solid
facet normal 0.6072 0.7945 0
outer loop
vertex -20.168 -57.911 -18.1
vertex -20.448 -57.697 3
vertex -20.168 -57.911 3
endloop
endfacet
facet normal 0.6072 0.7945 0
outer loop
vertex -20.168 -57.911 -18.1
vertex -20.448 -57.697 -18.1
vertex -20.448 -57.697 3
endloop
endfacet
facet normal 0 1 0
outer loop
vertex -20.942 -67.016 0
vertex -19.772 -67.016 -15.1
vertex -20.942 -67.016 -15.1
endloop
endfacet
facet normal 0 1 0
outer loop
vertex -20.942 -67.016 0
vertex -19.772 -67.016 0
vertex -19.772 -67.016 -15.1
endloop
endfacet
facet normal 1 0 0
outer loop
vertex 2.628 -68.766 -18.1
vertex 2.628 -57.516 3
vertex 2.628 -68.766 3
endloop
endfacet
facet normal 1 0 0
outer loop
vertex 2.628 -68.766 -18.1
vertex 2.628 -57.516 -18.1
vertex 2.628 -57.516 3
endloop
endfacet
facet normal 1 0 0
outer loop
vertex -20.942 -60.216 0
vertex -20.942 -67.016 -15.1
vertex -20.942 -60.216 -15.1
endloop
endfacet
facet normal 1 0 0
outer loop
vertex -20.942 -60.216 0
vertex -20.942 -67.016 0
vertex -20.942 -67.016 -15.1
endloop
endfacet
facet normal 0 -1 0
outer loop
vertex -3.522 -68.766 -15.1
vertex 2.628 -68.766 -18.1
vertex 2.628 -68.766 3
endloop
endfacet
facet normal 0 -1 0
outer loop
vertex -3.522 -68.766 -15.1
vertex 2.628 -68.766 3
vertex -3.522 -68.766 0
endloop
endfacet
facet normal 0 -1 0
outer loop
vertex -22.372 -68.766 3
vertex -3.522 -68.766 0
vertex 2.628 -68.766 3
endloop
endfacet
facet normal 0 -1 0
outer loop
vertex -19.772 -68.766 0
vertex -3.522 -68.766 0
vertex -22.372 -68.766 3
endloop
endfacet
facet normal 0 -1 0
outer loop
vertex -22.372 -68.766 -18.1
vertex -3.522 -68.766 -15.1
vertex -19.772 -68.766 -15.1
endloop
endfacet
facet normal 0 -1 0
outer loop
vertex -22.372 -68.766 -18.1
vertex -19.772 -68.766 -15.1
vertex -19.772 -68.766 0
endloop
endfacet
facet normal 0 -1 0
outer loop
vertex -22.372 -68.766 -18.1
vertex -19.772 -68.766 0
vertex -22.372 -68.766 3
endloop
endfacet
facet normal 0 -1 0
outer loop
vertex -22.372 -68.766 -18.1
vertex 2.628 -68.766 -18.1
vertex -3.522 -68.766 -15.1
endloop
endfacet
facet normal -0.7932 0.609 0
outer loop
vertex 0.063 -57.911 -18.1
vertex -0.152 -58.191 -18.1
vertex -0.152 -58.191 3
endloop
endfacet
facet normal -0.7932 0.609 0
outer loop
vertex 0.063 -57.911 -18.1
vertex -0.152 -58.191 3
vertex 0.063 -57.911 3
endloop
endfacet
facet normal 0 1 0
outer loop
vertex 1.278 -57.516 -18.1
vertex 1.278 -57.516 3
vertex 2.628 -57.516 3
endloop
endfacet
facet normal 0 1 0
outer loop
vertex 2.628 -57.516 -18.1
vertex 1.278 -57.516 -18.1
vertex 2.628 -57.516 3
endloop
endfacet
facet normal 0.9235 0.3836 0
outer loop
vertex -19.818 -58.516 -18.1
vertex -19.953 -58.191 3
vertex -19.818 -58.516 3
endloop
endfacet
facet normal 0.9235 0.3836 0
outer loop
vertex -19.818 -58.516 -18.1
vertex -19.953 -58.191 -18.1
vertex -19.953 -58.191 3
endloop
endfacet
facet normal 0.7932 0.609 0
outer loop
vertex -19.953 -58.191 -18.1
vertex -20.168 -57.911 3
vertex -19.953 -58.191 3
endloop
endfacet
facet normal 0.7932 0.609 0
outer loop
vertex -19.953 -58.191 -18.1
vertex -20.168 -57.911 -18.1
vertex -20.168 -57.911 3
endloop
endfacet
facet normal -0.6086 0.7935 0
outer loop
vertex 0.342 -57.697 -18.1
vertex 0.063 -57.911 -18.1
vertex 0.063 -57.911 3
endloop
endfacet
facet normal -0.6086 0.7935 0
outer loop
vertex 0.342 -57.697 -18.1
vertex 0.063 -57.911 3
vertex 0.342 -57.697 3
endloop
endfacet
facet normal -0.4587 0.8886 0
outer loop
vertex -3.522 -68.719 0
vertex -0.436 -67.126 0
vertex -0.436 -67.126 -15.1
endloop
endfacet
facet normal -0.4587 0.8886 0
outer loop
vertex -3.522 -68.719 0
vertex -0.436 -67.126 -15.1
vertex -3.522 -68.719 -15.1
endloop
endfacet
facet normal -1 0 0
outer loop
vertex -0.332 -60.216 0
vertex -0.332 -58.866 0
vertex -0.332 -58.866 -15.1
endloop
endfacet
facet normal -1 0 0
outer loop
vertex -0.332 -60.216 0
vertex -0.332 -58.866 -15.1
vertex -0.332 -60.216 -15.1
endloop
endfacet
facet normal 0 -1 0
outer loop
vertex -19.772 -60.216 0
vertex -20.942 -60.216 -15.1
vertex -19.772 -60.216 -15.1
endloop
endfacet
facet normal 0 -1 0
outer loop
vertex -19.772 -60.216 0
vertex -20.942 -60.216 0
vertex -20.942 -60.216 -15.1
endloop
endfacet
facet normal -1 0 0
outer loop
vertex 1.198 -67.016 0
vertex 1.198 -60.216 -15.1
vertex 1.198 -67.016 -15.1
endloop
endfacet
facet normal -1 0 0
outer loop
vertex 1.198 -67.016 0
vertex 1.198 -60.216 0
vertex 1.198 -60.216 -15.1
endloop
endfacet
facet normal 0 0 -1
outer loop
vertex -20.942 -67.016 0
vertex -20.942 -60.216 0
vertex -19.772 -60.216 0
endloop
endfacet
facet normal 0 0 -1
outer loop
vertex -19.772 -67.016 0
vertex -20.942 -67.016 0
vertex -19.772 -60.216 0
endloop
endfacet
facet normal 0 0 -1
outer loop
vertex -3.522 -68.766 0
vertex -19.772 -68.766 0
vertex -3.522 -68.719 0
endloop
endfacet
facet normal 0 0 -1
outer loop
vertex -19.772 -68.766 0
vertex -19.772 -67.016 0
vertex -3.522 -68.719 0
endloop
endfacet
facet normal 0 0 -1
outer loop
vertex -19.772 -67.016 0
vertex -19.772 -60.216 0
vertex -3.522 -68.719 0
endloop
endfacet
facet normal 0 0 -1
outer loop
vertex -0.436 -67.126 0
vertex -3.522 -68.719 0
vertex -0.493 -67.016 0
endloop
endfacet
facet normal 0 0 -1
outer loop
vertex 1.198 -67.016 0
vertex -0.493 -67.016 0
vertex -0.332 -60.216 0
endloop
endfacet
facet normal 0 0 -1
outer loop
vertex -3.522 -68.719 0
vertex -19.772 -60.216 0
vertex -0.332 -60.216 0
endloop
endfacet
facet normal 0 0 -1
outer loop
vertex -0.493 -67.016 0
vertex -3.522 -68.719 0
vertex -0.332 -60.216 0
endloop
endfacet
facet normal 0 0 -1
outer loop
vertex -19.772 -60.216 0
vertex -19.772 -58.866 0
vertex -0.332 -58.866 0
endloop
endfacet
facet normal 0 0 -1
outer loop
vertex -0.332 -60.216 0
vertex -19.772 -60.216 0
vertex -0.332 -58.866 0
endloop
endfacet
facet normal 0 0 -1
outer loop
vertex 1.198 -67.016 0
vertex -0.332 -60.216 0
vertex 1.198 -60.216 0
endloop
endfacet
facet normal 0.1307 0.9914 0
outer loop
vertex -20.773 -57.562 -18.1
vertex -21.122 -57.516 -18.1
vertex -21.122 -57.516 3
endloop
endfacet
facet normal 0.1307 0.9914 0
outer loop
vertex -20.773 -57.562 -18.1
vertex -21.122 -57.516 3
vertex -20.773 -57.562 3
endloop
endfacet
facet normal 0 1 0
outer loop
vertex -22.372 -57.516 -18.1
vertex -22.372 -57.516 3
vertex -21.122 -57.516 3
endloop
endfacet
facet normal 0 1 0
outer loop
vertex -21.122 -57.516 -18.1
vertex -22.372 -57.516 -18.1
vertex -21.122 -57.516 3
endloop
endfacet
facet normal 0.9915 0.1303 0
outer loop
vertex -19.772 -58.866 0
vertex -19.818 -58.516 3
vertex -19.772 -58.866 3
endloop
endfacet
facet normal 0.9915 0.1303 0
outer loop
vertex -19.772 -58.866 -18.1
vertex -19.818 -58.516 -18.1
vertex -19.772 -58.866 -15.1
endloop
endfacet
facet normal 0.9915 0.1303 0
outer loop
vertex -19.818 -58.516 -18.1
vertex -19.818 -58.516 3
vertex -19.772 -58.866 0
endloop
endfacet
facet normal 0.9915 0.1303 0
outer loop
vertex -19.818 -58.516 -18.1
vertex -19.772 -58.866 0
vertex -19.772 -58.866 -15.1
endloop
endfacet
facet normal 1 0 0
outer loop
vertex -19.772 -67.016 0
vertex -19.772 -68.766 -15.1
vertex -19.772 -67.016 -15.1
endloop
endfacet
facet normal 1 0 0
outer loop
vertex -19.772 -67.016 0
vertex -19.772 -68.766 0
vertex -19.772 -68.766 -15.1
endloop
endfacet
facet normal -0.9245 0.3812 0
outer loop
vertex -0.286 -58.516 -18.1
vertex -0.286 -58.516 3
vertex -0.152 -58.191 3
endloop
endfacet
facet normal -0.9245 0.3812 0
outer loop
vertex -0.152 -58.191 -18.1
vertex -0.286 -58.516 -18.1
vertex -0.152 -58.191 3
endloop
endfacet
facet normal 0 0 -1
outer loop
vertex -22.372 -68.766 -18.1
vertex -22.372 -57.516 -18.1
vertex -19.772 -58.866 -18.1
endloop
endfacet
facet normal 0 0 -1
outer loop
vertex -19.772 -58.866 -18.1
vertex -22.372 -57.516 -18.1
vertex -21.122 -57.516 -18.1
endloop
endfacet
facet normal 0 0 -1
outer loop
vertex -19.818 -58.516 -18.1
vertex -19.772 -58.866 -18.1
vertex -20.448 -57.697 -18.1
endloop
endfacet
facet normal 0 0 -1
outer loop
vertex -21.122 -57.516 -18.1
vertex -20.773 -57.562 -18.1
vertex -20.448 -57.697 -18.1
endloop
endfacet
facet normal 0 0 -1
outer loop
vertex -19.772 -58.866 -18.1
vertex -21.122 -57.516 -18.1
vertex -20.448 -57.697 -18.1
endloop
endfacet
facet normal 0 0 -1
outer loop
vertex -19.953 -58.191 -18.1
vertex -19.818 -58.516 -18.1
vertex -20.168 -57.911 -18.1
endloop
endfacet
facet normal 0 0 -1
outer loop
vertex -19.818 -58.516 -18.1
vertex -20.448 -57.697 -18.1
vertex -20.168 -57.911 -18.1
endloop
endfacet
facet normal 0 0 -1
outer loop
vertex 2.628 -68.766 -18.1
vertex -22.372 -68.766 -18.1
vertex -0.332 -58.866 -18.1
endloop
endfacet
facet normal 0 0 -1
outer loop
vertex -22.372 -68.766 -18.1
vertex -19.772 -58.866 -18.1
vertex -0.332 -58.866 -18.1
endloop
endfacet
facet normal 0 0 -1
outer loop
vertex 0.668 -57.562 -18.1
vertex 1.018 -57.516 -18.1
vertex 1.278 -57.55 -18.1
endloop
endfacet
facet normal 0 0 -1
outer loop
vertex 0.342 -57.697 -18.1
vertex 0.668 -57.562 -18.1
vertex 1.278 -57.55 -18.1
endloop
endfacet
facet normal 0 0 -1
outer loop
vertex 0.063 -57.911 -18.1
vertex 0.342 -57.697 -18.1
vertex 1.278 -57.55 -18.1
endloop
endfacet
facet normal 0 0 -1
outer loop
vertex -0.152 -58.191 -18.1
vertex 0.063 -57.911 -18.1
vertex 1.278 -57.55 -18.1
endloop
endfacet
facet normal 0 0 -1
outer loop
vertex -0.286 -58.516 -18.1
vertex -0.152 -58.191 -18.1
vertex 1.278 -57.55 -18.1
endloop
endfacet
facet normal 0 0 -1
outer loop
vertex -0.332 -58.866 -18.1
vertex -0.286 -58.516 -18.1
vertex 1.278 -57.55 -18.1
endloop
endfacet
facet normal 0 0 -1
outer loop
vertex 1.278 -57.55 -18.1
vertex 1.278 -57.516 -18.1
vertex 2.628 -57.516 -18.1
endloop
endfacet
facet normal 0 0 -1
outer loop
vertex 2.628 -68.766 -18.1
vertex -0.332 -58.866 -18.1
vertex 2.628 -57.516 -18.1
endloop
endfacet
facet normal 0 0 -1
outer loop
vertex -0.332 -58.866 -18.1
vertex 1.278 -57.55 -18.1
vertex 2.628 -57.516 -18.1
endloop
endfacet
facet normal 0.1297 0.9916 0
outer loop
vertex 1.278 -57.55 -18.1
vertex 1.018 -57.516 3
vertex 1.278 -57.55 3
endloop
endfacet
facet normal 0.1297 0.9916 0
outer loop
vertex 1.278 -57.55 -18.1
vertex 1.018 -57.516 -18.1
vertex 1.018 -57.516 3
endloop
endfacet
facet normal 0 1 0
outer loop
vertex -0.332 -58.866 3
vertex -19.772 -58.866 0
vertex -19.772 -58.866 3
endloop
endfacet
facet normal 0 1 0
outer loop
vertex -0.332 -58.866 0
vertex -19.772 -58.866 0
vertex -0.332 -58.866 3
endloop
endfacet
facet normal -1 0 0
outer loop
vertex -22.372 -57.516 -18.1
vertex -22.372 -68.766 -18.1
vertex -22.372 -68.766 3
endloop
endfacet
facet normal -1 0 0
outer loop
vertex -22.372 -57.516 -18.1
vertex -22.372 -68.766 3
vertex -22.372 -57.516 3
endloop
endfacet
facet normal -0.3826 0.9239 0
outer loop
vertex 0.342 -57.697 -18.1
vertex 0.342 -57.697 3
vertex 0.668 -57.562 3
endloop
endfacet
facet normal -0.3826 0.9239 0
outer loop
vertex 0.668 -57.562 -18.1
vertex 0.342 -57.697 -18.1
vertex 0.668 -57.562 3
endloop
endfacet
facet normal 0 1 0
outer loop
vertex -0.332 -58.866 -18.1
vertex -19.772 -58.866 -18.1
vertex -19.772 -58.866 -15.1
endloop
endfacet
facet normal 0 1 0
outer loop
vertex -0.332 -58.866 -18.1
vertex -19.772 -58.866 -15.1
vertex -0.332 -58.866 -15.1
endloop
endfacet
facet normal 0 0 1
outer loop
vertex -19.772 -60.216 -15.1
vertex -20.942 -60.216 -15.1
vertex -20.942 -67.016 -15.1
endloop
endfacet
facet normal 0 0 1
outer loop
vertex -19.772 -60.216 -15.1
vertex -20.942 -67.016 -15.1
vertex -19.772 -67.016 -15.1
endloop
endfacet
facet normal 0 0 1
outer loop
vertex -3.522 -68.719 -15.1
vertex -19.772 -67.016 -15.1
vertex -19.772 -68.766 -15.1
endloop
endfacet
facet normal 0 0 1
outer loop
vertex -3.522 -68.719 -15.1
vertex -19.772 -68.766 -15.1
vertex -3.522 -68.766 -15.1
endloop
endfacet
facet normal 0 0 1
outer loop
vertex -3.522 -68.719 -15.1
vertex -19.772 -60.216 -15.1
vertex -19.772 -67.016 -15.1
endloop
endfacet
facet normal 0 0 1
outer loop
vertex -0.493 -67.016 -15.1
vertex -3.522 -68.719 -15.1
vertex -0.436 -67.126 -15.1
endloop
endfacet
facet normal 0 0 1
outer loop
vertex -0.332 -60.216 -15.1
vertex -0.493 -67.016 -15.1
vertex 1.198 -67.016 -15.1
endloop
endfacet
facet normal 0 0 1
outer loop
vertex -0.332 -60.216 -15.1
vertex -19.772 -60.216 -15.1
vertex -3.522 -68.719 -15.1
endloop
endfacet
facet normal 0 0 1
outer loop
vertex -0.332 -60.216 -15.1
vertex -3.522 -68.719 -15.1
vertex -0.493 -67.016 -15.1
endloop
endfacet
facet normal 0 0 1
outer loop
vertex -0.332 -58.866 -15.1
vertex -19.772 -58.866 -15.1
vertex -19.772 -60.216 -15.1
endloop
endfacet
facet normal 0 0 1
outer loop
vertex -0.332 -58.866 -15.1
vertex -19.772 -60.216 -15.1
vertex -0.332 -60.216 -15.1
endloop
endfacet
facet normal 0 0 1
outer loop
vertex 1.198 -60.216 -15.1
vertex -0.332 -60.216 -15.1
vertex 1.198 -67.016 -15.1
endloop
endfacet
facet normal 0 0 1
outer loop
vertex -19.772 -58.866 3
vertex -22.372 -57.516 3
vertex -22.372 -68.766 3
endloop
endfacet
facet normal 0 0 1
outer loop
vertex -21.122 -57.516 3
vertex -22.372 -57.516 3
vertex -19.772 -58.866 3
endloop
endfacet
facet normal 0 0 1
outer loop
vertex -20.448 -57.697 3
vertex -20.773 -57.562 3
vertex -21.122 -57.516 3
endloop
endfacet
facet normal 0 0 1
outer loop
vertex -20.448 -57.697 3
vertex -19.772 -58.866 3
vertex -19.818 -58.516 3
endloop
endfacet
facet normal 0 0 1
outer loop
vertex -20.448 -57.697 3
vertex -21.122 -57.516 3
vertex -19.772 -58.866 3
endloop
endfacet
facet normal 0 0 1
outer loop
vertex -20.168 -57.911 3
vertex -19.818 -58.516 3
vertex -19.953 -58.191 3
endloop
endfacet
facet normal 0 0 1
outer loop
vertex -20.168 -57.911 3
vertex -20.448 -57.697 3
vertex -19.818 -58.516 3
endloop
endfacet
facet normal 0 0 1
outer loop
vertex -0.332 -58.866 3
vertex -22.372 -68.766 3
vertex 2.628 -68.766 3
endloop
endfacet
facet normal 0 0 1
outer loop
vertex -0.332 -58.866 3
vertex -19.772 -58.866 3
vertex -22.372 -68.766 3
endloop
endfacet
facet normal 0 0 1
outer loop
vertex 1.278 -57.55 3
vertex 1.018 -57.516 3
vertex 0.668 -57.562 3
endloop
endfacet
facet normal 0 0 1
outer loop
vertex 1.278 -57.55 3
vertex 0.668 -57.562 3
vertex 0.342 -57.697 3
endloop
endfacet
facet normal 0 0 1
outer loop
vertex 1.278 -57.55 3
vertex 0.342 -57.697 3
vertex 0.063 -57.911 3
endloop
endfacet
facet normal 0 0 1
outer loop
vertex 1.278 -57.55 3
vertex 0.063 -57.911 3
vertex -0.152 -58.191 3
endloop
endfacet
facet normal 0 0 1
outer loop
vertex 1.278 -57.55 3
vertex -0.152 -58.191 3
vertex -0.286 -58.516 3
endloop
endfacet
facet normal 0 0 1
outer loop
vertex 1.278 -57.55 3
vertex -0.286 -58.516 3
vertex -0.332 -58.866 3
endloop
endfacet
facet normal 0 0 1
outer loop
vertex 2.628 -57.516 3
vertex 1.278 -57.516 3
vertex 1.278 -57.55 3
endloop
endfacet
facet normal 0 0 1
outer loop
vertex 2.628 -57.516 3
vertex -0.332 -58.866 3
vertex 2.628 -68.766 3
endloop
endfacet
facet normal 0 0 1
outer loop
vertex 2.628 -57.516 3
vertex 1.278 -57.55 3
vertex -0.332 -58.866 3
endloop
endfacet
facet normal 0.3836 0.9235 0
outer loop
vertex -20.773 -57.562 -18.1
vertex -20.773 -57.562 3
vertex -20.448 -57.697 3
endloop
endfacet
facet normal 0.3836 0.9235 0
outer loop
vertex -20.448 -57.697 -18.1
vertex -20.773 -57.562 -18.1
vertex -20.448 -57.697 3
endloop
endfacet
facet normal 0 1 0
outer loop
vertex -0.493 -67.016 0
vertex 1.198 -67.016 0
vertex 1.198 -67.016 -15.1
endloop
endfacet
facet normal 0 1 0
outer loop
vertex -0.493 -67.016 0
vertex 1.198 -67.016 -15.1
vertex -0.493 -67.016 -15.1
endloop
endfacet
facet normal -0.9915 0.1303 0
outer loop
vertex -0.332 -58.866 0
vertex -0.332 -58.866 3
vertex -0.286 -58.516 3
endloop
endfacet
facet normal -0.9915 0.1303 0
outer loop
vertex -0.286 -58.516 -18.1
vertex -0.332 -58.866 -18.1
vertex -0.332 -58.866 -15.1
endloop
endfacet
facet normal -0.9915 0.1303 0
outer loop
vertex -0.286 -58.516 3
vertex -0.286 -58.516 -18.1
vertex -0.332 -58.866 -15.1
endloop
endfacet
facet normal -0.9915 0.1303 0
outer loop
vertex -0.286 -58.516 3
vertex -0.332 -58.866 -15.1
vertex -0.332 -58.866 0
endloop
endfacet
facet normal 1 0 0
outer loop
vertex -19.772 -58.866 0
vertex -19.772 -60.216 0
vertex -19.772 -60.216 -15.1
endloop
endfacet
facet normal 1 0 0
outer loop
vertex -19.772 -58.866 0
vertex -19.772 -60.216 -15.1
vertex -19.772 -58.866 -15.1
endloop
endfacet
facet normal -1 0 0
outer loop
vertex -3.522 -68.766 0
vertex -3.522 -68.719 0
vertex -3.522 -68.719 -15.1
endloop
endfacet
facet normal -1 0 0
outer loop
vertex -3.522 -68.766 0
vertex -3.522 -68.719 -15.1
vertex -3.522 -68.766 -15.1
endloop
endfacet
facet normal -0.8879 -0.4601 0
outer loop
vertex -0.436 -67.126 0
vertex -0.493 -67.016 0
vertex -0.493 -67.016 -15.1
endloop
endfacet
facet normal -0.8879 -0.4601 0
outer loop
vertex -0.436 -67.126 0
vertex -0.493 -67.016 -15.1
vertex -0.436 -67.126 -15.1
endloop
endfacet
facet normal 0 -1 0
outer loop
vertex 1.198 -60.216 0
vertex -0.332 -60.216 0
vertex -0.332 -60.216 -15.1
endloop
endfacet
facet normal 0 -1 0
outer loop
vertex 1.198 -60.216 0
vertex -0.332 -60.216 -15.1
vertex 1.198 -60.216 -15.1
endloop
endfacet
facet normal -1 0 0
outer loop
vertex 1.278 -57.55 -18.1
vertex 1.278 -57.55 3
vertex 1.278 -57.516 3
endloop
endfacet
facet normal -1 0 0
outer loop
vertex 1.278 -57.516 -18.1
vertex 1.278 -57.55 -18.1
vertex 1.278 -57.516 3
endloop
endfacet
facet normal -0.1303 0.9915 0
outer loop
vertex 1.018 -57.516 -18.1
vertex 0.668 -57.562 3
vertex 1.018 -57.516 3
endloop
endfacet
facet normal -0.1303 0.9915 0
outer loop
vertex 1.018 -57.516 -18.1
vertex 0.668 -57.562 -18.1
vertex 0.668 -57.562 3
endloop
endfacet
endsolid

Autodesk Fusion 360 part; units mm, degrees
sketch "keystone-side" plane through (0, 0, 0) normal (0, 0, 1) x (1, 0, 0)
  line L0 (0.3425, -57.6967) -> (0.6681, -57.5618)
  line L1 (-19.7725, -68.7658) -> (-19.7725, -67.0158)
  line L2 (1.2775, -57.55) -> (1.2775, -57.5158)
  line L3 (-19.7725, -58.8658) -> (-0.3325, -58.8658)
  line L4 (-0.4364, -67.1264) -> (-3.5225, -68.7192)
  line L5 (2.6275, -57.5158) -> (2.6275, -68.7658)
  line L6 (1.0175, -57.5158) -> (1.2775, -57.55)
  line L7 (-3.5225, -68.7658) -> (-19.7725, -68.7658)
  line L8 (0.6681, -57.5618) -> (1.0175, -57.5158)
  line L9 (-20.9425, -67.0158) -> (-20.9425, -60.2158)
  line L10 (1.2775, -57.5158) -> (2.6275, -57.5158)
  line L11 (-19.9533, -58.1908) -> (-19.8185, -58.5164)
  line L12 (-19.7725, -58.8658) -> (-0.3325, -58.8658)
  line L13 (-20.9425, -60.2158) -> (-19.7725, -60.2158)
  line L14 (0.0629, -57.9112) -> (0.3425, -57.6967)
  line L15 (-0.3325, -58.8658) -> (-0.3325, -60.2158)
  line L16 (-0.1516, -58.1908) -> (0.0629, -57.9112)
  line L17 (-19.7725, -67.0158) -> (-20.9425, -67.0158)
  line L18 (2.6275, -68.7658) -> (-22.3725, -68.7658)
  line L19 (-20.7731, -57.5618) -> (-20.4475, -57.6967)
  line L20 (-0.3325, -60.2158) -> (1.1975, -60.2158)
  line L21 (-20.4475, -57.6967) -> (-20.1679, -57.9112)
  line L22 (-19.7725, -60.2158) -> (-19.7725, -58.8658)
  line L23 (1.1975, -67.0158) -> (-0.4934, -67.0158)
  line L24 (-22.3725, -57.5158) -> (-21.1225, -57.5158)
  line L25 (-22.3725, -68.7658) -> (-22.3725, -57.5158)
  line L26 (-21.1225, -57.5158) -> (-20.7731, -57.5618)
  line L27 (-0.4934, -67.0158) -> (-0.4364, -67.1264)
  line L28 (-20.1679, -57.9112) -> (-19.9533, -58.1908)
  line L29 (-19.8185, -58.5164) -> (-19.7725, -58.8658)
  line L30 (-0.2865, -58.5164) -> (-0.1516, -58.1908)
  line L31 (-3.5225, -68.7192) -> (-3.5225, -68.7658)
  line L32 (-0.3325, -58.8658) -> (-0.2865, -58.5164)
  line L33 (1.1975, -60.2158) -> (1.1975, -67.0158)
  line L34 (-19.7725, -60.2158) -> (-0.3325, -60.2158)
extrude "Extrude1" add sketch "keystone-side" along normal blind 3
extrude "Extrude2" add sketch "keystone-side" against normal blind 18.1
extrude "Extrude3" cut sketch "keystone-side" against normal blind 15.1 contours L3 L12 L15 L22 L34 | L1 L4 L7 L9 L13 L17 L18 L20 L23 L27 L31 L33 L34
